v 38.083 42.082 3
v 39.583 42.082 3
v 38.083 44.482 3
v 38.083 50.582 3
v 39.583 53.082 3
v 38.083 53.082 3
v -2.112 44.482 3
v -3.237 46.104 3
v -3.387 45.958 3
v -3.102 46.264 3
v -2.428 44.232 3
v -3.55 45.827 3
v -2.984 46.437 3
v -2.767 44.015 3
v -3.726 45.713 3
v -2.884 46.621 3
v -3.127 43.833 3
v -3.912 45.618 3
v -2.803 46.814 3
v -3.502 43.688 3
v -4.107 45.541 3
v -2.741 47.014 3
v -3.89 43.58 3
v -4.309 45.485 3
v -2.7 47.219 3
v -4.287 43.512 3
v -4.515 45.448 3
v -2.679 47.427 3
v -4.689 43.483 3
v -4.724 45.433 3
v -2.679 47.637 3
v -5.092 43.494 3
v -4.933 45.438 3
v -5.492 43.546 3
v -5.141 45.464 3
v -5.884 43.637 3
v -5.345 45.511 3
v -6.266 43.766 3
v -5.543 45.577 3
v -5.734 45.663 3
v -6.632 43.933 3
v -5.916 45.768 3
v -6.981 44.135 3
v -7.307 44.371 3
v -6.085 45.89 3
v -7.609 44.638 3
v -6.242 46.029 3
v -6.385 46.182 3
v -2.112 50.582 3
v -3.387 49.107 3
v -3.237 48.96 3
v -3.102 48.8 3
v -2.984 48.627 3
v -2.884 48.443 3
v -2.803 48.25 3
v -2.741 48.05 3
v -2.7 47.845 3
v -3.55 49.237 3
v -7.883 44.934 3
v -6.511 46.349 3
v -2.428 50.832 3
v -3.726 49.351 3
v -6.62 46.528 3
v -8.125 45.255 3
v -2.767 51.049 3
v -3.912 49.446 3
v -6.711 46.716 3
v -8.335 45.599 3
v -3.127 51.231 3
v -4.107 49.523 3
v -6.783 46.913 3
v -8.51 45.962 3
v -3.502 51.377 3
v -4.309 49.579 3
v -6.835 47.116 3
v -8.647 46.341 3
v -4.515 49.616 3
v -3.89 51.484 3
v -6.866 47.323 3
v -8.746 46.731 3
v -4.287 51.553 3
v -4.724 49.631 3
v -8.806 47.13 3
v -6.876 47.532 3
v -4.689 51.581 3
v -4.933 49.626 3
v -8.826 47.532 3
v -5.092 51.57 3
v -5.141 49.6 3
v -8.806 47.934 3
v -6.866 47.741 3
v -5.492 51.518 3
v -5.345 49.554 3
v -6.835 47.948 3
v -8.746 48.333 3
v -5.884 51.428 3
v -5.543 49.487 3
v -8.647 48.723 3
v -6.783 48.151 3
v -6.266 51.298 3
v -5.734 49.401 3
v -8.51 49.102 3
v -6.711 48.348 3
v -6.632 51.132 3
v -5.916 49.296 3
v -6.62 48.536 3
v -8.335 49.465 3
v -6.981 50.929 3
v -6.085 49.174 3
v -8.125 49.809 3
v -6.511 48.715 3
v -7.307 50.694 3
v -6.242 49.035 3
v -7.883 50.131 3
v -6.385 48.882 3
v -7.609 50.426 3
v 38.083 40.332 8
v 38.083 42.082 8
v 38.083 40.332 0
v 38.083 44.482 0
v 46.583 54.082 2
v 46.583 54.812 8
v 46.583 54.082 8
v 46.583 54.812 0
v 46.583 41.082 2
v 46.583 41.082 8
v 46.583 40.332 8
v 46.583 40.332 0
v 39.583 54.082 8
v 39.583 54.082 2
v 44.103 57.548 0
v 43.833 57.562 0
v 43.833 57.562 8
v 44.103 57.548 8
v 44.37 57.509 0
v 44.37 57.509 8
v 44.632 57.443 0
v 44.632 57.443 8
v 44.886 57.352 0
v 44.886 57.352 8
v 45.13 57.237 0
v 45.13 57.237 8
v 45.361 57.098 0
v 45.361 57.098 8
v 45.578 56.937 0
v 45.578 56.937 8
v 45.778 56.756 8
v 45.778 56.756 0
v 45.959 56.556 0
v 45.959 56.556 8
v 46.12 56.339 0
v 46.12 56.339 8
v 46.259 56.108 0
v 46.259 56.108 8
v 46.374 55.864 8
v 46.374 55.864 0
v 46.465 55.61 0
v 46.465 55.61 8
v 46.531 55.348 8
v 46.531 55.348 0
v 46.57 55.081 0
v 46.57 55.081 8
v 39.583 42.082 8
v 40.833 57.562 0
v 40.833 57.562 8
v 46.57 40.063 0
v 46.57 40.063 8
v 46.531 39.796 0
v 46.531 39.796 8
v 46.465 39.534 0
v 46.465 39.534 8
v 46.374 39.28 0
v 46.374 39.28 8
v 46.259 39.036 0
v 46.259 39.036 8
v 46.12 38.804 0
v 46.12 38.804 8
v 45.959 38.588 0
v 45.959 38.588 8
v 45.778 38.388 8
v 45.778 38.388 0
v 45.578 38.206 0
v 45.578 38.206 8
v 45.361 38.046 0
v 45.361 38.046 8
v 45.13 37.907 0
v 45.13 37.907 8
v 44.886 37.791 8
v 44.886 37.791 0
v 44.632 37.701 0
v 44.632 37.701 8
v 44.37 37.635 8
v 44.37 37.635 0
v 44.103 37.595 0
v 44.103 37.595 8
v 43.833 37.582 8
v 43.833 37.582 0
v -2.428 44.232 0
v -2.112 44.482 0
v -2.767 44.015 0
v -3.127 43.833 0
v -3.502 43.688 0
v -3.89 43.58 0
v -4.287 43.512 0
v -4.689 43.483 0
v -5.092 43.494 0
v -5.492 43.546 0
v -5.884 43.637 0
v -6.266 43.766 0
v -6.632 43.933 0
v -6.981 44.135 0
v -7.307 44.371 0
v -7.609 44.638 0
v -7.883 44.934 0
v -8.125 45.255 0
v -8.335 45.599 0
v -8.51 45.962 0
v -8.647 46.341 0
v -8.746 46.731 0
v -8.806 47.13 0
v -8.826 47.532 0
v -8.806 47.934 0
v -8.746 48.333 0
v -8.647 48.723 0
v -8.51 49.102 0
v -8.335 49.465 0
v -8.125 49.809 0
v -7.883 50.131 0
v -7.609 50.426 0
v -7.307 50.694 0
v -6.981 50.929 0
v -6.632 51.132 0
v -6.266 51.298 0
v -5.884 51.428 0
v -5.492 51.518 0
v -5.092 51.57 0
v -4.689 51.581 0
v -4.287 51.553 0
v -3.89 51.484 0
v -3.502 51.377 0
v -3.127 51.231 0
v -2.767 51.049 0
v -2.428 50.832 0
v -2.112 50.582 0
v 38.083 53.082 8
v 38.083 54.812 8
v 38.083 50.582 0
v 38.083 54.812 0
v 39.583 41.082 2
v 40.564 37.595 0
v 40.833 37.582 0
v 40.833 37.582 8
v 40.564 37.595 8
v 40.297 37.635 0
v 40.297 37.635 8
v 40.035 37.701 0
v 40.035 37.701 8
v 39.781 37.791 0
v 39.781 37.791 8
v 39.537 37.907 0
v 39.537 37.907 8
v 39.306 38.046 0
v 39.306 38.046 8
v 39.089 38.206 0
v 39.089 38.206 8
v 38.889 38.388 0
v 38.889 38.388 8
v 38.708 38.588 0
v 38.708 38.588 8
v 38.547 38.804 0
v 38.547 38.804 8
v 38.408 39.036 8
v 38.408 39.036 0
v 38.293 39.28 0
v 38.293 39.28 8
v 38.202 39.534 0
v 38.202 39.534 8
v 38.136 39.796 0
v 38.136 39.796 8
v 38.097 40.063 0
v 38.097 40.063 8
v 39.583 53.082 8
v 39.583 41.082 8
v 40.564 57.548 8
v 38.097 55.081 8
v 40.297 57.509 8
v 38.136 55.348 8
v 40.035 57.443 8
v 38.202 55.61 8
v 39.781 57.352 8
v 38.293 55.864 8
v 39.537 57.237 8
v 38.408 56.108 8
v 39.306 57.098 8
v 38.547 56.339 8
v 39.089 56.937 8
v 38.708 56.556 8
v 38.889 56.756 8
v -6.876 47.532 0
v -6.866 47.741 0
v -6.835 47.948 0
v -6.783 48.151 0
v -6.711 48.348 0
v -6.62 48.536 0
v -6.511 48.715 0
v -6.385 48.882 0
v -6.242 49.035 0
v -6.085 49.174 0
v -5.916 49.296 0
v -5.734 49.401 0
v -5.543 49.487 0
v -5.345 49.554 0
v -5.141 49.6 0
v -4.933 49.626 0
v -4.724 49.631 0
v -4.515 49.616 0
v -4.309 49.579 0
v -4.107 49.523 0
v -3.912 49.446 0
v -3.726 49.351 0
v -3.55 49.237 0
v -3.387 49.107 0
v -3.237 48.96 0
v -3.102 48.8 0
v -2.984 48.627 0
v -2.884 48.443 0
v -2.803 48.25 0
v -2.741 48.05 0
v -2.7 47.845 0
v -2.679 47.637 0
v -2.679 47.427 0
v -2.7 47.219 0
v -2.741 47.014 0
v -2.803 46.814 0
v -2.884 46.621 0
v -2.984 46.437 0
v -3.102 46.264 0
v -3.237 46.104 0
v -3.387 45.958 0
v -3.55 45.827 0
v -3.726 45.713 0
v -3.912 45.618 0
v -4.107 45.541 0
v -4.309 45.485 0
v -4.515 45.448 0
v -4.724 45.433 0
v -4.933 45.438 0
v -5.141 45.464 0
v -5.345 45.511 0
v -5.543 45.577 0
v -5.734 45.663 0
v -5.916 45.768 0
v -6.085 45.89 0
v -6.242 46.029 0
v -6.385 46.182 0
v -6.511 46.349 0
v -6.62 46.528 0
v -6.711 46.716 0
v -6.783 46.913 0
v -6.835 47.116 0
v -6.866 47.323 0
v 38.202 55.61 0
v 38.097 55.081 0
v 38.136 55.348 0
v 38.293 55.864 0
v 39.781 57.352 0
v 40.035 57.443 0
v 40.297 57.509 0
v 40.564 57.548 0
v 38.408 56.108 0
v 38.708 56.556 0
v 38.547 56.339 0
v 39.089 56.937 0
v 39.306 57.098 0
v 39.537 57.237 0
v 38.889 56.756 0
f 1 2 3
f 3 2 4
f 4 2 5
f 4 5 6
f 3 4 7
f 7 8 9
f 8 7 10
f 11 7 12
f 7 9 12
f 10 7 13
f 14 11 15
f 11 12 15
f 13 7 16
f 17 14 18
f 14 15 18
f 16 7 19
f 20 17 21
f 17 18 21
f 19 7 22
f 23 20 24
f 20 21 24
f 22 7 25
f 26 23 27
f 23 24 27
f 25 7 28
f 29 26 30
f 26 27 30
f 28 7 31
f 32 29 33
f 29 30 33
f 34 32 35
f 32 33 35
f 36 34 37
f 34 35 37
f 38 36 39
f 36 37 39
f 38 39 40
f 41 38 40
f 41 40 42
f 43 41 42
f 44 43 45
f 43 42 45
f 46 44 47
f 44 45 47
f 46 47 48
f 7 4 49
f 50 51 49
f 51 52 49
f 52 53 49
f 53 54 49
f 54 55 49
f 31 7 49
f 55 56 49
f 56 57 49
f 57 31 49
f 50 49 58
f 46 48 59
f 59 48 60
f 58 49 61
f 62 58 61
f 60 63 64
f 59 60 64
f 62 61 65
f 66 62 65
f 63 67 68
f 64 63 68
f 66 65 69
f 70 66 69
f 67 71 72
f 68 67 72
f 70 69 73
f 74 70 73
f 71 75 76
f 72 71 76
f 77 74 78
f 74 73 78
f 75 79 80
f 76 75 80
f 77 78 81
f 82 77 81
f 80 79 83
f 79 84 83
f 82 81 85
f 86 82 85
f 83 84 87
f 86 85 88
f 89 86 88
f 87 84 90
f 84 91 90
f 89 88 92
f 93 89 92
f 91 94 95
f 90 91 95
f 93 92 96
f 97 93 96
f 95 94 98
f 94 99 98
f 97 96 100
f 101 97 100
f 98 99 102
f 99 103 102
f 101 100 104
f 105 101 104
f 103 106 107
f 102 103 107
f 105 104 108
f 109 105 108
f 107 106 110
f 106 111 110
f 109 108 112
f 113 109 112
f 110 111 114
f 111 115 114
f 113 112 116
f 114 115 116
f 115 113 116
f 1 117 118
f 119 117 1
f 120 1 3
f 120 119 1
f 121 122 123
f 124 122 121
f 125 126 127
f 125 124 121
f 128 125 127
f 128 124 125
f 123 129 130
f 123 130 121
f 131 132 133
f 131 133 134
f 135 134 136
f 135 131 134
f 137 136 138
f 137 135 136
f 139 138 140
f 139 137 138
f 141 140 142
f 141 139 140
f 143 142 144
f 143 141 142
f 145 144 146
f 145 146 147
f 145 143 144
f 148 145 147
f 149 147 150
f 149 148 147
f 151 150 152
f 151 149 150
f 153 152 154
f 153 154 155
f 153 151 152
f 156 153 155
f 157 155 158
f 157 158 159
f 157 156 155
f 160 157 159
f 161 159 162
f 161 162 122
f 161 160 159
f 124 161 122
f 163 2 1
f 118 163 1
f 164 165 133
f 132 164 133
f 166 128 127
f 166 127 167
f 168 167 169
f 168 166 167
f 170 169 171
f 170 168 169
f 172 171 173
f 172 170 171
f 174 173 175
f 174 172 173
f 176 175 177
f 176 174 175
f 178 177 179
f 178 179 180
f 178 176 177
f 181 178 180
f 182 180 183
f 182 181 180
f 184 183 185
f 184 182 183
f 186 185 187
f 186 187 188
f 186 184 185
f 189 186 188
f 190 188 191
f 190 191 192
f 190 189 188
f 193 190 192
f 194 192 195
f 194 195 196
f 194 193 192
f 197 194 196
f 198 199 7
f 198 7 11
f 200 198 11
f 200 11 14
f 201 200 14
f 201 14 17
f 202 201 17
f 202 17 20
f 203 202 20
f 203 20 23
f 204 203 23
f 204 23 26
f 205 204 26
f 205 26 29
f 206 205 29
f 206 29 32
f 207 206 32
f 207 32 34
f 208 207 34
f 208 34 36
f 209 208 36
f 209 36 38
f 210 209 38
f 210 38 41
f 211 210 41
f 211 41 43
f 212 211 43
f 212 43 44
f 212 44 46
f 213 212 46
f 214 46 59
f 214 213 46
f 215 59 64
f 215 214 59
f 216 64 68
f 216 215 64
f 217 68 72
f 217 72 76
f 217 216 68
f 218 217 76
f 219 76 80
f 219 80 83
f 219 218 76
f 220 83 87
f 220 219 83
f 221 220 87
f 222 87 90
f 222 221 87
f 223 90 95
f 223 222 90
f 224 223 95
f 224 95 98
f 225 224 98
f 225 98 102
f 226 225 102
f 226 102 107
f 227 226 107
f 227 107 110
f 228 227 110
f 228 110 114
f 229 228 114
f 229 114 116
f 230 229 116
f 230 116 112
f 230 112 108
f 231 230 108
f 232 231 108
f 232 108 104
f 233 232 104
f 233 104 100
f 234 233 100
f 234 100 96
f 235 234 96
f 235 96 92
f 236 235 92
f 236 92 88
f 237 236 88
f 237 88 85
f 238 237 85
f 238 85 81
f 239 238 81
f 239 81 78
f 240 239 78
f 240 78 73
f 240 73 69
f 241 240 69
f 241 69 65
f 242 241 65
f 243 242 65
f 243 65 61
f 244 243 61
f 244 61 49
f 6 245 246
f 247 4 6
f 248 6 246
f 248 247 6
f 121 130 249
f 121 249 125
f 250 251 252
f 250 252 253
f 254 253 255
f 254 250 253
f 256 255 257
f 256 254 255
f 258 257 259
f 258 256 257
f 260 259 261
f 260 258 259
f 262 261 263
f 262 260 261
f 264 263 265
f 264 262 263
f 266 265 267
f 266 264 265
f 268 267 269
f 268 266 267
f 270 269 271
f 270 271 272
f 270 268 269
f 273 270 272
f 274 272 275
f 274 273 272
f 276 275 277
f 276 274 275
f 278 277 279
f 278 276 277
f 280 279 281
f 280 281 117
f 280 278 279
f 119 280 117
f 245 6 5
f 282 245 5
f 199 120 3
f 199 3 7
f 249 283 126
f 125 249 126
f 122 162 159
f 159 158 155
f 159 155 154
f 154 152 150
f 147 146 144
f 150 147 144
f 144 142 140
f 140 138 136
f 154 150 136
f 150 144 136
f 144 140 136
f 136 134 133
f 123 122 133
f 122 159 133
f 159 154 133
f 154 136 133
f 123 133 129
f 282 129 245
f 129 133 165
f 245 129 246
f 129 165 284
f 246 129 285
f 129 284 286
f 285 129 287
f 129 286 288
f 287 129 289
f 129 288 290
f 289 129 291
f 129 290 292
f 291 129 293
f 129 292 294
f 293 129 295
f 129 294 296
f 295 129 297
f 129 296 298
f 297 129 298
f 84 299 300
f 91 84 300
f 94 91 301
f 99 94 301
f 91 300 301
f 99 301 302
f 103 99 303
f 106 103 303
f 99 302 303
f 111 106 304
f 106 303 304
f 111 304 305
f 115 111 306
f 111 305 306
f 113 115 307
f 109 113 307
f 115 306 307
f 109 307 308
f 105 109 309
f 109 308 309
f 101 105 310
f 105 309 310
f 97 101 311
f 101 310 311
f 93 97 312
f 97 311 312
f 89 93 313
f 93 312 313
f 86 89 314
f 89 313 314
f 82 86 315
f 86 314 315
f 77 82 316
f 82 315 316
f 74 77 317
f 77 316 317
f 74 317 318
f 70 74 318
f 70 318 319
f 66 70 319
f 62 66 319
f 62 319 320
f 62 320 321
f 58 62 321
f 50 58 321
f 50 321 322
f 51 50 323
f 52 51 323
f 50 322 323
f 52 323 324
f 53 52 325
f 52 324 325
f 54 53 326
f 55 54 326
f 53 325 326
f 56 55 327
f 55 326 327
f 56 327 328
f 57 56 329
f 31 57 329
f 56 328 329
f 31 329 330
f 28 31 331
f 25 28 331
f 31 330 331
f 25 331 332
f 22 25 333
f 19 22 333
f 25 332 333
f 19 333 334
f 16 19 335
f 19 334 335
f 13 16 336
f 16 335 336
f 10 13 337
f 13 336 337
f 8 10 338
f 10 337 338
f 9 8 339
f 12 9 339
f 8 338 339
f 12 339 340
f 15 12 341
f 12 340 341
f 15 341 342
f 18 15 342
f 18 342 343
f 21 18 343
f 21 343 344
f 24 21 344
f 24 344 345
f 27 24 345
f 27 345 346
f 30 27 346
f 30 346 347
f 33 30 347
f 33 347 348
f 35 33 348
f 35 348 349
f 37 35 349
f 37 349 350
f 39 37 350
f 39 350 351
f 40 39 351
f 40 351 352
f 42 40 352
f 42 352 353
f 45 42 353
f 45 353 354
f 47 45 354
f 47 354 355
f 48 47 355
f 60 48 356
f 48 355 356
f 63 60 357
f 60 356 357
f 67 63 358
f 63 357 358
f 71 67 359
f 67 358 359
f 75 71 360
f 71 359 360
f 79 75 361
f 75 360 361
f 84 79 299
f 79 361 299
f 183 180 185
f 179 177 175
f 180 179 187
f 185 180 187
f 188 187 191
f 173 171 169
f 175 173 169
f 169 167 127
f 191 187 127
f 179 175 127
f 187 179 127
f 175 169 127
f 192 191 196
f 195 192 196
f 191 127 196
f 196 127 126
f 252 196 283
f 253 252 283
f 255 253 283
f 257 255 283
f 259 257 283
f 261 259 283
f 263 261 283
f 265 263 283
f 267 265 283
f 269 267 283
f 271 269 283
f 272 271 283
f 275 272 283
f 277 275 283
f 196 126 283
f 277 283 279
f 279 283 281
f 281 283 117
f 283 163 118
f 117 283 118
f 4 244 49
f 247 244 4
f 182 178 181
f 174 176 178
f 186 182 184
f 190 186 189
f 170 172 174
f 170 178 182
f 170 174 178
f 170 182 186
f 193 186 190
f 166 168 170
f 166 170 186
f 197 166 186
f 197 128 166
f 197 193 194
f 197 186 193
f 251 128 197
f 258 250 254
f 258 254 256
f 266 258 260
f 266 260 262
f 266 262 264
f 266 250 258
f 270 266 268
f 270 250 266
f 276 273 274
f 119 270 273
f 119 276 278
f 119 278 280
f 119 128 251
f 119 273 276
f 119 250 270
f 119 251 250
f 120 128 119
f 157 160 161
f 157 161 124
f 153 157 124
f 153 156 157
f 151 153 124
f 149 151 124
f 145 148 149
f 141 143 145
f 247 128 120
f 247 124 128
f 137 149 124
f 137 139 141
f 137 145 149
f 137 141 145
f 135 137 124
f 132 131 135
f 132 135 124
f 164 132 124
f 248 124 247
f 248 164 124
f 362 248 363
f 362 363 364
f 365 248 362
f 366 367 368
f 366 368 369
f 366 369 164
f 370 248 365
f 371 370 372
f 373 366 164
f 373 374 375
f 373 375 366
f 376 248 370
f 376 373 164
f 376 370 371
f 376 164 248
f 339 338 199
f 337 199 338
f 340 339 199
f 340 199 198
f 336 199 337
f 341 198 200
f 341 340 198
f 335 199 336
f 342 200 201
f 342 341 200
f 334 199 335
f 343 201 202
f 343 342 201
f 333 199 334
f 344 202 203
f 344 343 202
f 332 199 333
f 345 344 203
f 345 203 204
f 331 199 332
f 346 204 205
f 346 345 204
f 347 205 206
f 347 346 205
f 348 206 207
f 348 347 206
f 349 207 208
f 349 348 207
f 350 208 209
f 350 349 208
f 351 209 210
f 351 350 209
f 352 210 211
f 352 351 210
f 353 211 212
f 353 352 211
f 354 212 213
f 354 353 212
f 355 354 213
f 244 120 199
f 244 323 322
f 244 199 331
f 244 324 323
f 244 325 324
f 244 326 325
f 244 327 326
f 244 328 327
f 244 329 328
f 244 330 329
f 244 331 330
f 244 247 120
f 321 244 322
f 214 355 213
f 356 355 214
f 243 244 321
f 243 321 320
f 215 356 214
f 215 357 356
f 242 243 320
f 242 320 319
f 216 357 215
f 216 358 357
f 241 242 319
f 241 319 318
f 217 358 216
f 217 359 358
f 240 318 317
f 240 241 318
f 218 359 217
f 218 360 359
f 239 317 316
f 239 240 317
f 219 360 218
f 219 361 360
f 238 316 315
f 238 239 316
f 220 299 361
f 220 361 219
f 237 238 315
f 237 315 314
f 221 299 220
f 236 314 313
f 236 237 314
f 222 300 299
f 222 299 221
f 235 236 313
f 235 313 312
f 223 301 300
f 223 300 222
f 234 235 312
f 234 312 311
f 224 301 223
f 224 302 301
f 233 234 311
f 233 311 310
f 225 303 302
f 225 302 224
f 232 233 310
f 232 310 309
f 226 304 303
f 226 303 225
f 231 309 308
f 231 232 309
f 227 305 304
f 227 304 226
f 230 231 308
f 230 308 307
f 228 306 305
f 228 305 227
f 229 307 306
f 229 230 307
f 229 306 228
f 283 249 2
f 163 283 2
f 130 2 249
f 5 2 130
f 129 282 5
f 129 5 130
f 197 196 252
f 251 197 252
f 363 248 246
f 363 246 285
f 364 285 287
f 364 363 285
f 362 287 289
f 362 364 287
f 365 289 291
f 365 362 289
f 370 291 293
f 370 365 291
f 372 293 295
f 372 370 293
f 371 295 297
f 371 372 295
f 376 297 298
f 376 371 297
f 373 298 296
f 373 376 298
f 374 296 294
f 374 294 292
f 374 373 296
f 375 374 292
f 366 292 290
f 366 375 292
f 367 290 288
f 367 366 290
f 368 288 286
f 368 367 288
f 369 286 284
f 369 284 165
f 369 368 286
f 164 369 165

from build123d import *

# Parameters (mm, degrees)
CROQUIS5_R              = 2.552588688
SALIENTE_EXTRUIR4_DEPTH = 8
CORTAR_EXTRUIR2_START   = -5
CROQUIS6_R              = 2.552588688
CORTAR_EXTRUIR2_DEPTH   = 5
CROQUIS7_W              = 7
CROQUIS7_H              = 13
CORTAR_EXTRUIR3_DEPTH   = 6
CROQUIS8_W              = 15
CROQUIS8_H              = 30
CORTAR_EXTRUIR4_DEPTH   = 10
CROQUIS9_R              = 4.05
SALIENTE_EXTRUIR5_DEPTH = 3
CROQUIS10_R             = 2.1
CORTAR_EXTRUIR5_DEPTH   = 3


with BuildPart() as part:
    # Croquis5 → Saliente-Extruir4 (new body)
    with BuildSketch(Plane.XY):
        with BuildLine():
            Line((-12.912379316, 50.582104264), (38.083380168, 50.582104264))
            Line((38.083380168, 50.582104264), (38.083380168, 54.811507329))
            ThreePointArc((38.083380168, 54.811507329), (38.888836519, 56.756050977), (40.833380168, 57.561507329))
            Line((40.833380168, 57.561507329), (43.833380168, 57.561507329))
            ThreePointArc((43.833380168, 57.561507329), (45.777923816, 56.756050977), (46.583380168, 54.811507329))
            Line((46.583380168, 54.811507329), (46.583380168, 40.332104264))
            ThreePointArc((46.583380168, 40.332104264), (45.777923816, 38.387560616), (43.833380168, 37.582104264))
            Line((43.833380168, 37.582104264), (40.833380168, 37.582104264))
            ThreePointArc((40.833380168, 37.582104264), (38.888836519, 38.387560616), (38.083380168, 40.332104264))
            Line((38.083380168, 40.332104264), (38.083380168, 44.482104264))
            Line((38.083380168, 44.482104264), (-12.912379316, 44.482104264))
            ThreePointArc((-12.912379316, 44.482104264), (-19.776162486, 47.532104264), (-12.912379316, 50.582104264))
        make_face()
        with Locations((-15.666619832, 47.532104264)):
            Circle(CROQUIS5_R, mode=Mode.SUBTRACT)
    extrude(amount=SALIENTE_EXTRUIR4_DEPTH)

    # Croquis6 → Cortar-Extruir2 (cut)
    with BuildSketch(Plane.XY.offset(8).offset(CORTAR_EXTRUIR2_START)):
        with BuildLine():
            Line((-12.912379316, 50.582104264), (38.083380168, 50.582104264))
            Line((38.083380168, 50.582104264), (38.083380168, 53.082104264))
            Line((38.083380168, 53.082104264), (39.583380168, 53.082104264))
            Line((39.583380168, 53.082104264), (39.583380168, 42.082104264))
            Line((39.583380168, 42.082104264), (38.083380168, 42.082104264))
            Line((38.083380168, 42.082104264), (38.083380168, 44.482104264))
            Line((38.083380168, 44.482104264), (-12.912379316, 44.482104264))
            ThreePointArc((-12.912379316, 44.482104264), (-19.776162486, 47.532104264), (-12.912379316, 50.582104264))
        make_face()
        with Locations((-15.666619832, 47.532104264)):
            Circle(CROQUIS6_R, mode=Mode.SUBTRACT)
    extrude(amount=CORTAR_EXTRUIR2_DEPTH, mode=Mode.SUBTRACT)

    # Croquis7 → Cortar-Extruir3 (cut)
    with BuildSketch(Plane.XY.offset(8)):
        with Locations((43.083380168, 47.582104264)):
            Rectangle(CROQUIS7_W, CROQUIS7_H)
    extrude(amount=-CORTAR_EXTRUIR3_DEPTH, mode=Mode.SUBTRACT)

    # Croquis8 → Cortar-Extruir4 (cut)
    with BuildSketch(Plane(origin=(0, 0, 0), x_dir=(-1, 0, 0), z_dir=(0, 0, -1))):
        with Locations((12.276162486, 38.194032094)):
            Rectangle(CROQUIS8_W, CROQUIS8_H)
    extrude(amount=-CORTAR_EXTRUIR4_DEPTH, mode=Mode.SUBTRACT)

    # Croquis9 → Saliente-Extruir5 (add)
    with BuildSketch(Plane(origin=(0, 0, 0), x_dir=(-1, 0, 0), z_dir=(0, 0, -1))):
        with Locations((4.776162486, 47.532104264)):
            Circle(CROQUIS9_R)
    extrude(amount=-SALIENTE_EXTRUIR5_DEPTH)

    # Croquis10 → Cortar-Extruir5 (cut)
    with BuildSketch(Plane(origin=(0, 0, 0), x_dir=(-1, 0, 0), z_dir=(0, 0, -1))):
        with Locations((4.776162486, 47.532104264)):
            Circle(CROQUIS10_R)
    extrude(amount=-CORTAR_EXTRUIR5_DEPTH, mode=Mode.SUBTRACT)


solid = part.part
